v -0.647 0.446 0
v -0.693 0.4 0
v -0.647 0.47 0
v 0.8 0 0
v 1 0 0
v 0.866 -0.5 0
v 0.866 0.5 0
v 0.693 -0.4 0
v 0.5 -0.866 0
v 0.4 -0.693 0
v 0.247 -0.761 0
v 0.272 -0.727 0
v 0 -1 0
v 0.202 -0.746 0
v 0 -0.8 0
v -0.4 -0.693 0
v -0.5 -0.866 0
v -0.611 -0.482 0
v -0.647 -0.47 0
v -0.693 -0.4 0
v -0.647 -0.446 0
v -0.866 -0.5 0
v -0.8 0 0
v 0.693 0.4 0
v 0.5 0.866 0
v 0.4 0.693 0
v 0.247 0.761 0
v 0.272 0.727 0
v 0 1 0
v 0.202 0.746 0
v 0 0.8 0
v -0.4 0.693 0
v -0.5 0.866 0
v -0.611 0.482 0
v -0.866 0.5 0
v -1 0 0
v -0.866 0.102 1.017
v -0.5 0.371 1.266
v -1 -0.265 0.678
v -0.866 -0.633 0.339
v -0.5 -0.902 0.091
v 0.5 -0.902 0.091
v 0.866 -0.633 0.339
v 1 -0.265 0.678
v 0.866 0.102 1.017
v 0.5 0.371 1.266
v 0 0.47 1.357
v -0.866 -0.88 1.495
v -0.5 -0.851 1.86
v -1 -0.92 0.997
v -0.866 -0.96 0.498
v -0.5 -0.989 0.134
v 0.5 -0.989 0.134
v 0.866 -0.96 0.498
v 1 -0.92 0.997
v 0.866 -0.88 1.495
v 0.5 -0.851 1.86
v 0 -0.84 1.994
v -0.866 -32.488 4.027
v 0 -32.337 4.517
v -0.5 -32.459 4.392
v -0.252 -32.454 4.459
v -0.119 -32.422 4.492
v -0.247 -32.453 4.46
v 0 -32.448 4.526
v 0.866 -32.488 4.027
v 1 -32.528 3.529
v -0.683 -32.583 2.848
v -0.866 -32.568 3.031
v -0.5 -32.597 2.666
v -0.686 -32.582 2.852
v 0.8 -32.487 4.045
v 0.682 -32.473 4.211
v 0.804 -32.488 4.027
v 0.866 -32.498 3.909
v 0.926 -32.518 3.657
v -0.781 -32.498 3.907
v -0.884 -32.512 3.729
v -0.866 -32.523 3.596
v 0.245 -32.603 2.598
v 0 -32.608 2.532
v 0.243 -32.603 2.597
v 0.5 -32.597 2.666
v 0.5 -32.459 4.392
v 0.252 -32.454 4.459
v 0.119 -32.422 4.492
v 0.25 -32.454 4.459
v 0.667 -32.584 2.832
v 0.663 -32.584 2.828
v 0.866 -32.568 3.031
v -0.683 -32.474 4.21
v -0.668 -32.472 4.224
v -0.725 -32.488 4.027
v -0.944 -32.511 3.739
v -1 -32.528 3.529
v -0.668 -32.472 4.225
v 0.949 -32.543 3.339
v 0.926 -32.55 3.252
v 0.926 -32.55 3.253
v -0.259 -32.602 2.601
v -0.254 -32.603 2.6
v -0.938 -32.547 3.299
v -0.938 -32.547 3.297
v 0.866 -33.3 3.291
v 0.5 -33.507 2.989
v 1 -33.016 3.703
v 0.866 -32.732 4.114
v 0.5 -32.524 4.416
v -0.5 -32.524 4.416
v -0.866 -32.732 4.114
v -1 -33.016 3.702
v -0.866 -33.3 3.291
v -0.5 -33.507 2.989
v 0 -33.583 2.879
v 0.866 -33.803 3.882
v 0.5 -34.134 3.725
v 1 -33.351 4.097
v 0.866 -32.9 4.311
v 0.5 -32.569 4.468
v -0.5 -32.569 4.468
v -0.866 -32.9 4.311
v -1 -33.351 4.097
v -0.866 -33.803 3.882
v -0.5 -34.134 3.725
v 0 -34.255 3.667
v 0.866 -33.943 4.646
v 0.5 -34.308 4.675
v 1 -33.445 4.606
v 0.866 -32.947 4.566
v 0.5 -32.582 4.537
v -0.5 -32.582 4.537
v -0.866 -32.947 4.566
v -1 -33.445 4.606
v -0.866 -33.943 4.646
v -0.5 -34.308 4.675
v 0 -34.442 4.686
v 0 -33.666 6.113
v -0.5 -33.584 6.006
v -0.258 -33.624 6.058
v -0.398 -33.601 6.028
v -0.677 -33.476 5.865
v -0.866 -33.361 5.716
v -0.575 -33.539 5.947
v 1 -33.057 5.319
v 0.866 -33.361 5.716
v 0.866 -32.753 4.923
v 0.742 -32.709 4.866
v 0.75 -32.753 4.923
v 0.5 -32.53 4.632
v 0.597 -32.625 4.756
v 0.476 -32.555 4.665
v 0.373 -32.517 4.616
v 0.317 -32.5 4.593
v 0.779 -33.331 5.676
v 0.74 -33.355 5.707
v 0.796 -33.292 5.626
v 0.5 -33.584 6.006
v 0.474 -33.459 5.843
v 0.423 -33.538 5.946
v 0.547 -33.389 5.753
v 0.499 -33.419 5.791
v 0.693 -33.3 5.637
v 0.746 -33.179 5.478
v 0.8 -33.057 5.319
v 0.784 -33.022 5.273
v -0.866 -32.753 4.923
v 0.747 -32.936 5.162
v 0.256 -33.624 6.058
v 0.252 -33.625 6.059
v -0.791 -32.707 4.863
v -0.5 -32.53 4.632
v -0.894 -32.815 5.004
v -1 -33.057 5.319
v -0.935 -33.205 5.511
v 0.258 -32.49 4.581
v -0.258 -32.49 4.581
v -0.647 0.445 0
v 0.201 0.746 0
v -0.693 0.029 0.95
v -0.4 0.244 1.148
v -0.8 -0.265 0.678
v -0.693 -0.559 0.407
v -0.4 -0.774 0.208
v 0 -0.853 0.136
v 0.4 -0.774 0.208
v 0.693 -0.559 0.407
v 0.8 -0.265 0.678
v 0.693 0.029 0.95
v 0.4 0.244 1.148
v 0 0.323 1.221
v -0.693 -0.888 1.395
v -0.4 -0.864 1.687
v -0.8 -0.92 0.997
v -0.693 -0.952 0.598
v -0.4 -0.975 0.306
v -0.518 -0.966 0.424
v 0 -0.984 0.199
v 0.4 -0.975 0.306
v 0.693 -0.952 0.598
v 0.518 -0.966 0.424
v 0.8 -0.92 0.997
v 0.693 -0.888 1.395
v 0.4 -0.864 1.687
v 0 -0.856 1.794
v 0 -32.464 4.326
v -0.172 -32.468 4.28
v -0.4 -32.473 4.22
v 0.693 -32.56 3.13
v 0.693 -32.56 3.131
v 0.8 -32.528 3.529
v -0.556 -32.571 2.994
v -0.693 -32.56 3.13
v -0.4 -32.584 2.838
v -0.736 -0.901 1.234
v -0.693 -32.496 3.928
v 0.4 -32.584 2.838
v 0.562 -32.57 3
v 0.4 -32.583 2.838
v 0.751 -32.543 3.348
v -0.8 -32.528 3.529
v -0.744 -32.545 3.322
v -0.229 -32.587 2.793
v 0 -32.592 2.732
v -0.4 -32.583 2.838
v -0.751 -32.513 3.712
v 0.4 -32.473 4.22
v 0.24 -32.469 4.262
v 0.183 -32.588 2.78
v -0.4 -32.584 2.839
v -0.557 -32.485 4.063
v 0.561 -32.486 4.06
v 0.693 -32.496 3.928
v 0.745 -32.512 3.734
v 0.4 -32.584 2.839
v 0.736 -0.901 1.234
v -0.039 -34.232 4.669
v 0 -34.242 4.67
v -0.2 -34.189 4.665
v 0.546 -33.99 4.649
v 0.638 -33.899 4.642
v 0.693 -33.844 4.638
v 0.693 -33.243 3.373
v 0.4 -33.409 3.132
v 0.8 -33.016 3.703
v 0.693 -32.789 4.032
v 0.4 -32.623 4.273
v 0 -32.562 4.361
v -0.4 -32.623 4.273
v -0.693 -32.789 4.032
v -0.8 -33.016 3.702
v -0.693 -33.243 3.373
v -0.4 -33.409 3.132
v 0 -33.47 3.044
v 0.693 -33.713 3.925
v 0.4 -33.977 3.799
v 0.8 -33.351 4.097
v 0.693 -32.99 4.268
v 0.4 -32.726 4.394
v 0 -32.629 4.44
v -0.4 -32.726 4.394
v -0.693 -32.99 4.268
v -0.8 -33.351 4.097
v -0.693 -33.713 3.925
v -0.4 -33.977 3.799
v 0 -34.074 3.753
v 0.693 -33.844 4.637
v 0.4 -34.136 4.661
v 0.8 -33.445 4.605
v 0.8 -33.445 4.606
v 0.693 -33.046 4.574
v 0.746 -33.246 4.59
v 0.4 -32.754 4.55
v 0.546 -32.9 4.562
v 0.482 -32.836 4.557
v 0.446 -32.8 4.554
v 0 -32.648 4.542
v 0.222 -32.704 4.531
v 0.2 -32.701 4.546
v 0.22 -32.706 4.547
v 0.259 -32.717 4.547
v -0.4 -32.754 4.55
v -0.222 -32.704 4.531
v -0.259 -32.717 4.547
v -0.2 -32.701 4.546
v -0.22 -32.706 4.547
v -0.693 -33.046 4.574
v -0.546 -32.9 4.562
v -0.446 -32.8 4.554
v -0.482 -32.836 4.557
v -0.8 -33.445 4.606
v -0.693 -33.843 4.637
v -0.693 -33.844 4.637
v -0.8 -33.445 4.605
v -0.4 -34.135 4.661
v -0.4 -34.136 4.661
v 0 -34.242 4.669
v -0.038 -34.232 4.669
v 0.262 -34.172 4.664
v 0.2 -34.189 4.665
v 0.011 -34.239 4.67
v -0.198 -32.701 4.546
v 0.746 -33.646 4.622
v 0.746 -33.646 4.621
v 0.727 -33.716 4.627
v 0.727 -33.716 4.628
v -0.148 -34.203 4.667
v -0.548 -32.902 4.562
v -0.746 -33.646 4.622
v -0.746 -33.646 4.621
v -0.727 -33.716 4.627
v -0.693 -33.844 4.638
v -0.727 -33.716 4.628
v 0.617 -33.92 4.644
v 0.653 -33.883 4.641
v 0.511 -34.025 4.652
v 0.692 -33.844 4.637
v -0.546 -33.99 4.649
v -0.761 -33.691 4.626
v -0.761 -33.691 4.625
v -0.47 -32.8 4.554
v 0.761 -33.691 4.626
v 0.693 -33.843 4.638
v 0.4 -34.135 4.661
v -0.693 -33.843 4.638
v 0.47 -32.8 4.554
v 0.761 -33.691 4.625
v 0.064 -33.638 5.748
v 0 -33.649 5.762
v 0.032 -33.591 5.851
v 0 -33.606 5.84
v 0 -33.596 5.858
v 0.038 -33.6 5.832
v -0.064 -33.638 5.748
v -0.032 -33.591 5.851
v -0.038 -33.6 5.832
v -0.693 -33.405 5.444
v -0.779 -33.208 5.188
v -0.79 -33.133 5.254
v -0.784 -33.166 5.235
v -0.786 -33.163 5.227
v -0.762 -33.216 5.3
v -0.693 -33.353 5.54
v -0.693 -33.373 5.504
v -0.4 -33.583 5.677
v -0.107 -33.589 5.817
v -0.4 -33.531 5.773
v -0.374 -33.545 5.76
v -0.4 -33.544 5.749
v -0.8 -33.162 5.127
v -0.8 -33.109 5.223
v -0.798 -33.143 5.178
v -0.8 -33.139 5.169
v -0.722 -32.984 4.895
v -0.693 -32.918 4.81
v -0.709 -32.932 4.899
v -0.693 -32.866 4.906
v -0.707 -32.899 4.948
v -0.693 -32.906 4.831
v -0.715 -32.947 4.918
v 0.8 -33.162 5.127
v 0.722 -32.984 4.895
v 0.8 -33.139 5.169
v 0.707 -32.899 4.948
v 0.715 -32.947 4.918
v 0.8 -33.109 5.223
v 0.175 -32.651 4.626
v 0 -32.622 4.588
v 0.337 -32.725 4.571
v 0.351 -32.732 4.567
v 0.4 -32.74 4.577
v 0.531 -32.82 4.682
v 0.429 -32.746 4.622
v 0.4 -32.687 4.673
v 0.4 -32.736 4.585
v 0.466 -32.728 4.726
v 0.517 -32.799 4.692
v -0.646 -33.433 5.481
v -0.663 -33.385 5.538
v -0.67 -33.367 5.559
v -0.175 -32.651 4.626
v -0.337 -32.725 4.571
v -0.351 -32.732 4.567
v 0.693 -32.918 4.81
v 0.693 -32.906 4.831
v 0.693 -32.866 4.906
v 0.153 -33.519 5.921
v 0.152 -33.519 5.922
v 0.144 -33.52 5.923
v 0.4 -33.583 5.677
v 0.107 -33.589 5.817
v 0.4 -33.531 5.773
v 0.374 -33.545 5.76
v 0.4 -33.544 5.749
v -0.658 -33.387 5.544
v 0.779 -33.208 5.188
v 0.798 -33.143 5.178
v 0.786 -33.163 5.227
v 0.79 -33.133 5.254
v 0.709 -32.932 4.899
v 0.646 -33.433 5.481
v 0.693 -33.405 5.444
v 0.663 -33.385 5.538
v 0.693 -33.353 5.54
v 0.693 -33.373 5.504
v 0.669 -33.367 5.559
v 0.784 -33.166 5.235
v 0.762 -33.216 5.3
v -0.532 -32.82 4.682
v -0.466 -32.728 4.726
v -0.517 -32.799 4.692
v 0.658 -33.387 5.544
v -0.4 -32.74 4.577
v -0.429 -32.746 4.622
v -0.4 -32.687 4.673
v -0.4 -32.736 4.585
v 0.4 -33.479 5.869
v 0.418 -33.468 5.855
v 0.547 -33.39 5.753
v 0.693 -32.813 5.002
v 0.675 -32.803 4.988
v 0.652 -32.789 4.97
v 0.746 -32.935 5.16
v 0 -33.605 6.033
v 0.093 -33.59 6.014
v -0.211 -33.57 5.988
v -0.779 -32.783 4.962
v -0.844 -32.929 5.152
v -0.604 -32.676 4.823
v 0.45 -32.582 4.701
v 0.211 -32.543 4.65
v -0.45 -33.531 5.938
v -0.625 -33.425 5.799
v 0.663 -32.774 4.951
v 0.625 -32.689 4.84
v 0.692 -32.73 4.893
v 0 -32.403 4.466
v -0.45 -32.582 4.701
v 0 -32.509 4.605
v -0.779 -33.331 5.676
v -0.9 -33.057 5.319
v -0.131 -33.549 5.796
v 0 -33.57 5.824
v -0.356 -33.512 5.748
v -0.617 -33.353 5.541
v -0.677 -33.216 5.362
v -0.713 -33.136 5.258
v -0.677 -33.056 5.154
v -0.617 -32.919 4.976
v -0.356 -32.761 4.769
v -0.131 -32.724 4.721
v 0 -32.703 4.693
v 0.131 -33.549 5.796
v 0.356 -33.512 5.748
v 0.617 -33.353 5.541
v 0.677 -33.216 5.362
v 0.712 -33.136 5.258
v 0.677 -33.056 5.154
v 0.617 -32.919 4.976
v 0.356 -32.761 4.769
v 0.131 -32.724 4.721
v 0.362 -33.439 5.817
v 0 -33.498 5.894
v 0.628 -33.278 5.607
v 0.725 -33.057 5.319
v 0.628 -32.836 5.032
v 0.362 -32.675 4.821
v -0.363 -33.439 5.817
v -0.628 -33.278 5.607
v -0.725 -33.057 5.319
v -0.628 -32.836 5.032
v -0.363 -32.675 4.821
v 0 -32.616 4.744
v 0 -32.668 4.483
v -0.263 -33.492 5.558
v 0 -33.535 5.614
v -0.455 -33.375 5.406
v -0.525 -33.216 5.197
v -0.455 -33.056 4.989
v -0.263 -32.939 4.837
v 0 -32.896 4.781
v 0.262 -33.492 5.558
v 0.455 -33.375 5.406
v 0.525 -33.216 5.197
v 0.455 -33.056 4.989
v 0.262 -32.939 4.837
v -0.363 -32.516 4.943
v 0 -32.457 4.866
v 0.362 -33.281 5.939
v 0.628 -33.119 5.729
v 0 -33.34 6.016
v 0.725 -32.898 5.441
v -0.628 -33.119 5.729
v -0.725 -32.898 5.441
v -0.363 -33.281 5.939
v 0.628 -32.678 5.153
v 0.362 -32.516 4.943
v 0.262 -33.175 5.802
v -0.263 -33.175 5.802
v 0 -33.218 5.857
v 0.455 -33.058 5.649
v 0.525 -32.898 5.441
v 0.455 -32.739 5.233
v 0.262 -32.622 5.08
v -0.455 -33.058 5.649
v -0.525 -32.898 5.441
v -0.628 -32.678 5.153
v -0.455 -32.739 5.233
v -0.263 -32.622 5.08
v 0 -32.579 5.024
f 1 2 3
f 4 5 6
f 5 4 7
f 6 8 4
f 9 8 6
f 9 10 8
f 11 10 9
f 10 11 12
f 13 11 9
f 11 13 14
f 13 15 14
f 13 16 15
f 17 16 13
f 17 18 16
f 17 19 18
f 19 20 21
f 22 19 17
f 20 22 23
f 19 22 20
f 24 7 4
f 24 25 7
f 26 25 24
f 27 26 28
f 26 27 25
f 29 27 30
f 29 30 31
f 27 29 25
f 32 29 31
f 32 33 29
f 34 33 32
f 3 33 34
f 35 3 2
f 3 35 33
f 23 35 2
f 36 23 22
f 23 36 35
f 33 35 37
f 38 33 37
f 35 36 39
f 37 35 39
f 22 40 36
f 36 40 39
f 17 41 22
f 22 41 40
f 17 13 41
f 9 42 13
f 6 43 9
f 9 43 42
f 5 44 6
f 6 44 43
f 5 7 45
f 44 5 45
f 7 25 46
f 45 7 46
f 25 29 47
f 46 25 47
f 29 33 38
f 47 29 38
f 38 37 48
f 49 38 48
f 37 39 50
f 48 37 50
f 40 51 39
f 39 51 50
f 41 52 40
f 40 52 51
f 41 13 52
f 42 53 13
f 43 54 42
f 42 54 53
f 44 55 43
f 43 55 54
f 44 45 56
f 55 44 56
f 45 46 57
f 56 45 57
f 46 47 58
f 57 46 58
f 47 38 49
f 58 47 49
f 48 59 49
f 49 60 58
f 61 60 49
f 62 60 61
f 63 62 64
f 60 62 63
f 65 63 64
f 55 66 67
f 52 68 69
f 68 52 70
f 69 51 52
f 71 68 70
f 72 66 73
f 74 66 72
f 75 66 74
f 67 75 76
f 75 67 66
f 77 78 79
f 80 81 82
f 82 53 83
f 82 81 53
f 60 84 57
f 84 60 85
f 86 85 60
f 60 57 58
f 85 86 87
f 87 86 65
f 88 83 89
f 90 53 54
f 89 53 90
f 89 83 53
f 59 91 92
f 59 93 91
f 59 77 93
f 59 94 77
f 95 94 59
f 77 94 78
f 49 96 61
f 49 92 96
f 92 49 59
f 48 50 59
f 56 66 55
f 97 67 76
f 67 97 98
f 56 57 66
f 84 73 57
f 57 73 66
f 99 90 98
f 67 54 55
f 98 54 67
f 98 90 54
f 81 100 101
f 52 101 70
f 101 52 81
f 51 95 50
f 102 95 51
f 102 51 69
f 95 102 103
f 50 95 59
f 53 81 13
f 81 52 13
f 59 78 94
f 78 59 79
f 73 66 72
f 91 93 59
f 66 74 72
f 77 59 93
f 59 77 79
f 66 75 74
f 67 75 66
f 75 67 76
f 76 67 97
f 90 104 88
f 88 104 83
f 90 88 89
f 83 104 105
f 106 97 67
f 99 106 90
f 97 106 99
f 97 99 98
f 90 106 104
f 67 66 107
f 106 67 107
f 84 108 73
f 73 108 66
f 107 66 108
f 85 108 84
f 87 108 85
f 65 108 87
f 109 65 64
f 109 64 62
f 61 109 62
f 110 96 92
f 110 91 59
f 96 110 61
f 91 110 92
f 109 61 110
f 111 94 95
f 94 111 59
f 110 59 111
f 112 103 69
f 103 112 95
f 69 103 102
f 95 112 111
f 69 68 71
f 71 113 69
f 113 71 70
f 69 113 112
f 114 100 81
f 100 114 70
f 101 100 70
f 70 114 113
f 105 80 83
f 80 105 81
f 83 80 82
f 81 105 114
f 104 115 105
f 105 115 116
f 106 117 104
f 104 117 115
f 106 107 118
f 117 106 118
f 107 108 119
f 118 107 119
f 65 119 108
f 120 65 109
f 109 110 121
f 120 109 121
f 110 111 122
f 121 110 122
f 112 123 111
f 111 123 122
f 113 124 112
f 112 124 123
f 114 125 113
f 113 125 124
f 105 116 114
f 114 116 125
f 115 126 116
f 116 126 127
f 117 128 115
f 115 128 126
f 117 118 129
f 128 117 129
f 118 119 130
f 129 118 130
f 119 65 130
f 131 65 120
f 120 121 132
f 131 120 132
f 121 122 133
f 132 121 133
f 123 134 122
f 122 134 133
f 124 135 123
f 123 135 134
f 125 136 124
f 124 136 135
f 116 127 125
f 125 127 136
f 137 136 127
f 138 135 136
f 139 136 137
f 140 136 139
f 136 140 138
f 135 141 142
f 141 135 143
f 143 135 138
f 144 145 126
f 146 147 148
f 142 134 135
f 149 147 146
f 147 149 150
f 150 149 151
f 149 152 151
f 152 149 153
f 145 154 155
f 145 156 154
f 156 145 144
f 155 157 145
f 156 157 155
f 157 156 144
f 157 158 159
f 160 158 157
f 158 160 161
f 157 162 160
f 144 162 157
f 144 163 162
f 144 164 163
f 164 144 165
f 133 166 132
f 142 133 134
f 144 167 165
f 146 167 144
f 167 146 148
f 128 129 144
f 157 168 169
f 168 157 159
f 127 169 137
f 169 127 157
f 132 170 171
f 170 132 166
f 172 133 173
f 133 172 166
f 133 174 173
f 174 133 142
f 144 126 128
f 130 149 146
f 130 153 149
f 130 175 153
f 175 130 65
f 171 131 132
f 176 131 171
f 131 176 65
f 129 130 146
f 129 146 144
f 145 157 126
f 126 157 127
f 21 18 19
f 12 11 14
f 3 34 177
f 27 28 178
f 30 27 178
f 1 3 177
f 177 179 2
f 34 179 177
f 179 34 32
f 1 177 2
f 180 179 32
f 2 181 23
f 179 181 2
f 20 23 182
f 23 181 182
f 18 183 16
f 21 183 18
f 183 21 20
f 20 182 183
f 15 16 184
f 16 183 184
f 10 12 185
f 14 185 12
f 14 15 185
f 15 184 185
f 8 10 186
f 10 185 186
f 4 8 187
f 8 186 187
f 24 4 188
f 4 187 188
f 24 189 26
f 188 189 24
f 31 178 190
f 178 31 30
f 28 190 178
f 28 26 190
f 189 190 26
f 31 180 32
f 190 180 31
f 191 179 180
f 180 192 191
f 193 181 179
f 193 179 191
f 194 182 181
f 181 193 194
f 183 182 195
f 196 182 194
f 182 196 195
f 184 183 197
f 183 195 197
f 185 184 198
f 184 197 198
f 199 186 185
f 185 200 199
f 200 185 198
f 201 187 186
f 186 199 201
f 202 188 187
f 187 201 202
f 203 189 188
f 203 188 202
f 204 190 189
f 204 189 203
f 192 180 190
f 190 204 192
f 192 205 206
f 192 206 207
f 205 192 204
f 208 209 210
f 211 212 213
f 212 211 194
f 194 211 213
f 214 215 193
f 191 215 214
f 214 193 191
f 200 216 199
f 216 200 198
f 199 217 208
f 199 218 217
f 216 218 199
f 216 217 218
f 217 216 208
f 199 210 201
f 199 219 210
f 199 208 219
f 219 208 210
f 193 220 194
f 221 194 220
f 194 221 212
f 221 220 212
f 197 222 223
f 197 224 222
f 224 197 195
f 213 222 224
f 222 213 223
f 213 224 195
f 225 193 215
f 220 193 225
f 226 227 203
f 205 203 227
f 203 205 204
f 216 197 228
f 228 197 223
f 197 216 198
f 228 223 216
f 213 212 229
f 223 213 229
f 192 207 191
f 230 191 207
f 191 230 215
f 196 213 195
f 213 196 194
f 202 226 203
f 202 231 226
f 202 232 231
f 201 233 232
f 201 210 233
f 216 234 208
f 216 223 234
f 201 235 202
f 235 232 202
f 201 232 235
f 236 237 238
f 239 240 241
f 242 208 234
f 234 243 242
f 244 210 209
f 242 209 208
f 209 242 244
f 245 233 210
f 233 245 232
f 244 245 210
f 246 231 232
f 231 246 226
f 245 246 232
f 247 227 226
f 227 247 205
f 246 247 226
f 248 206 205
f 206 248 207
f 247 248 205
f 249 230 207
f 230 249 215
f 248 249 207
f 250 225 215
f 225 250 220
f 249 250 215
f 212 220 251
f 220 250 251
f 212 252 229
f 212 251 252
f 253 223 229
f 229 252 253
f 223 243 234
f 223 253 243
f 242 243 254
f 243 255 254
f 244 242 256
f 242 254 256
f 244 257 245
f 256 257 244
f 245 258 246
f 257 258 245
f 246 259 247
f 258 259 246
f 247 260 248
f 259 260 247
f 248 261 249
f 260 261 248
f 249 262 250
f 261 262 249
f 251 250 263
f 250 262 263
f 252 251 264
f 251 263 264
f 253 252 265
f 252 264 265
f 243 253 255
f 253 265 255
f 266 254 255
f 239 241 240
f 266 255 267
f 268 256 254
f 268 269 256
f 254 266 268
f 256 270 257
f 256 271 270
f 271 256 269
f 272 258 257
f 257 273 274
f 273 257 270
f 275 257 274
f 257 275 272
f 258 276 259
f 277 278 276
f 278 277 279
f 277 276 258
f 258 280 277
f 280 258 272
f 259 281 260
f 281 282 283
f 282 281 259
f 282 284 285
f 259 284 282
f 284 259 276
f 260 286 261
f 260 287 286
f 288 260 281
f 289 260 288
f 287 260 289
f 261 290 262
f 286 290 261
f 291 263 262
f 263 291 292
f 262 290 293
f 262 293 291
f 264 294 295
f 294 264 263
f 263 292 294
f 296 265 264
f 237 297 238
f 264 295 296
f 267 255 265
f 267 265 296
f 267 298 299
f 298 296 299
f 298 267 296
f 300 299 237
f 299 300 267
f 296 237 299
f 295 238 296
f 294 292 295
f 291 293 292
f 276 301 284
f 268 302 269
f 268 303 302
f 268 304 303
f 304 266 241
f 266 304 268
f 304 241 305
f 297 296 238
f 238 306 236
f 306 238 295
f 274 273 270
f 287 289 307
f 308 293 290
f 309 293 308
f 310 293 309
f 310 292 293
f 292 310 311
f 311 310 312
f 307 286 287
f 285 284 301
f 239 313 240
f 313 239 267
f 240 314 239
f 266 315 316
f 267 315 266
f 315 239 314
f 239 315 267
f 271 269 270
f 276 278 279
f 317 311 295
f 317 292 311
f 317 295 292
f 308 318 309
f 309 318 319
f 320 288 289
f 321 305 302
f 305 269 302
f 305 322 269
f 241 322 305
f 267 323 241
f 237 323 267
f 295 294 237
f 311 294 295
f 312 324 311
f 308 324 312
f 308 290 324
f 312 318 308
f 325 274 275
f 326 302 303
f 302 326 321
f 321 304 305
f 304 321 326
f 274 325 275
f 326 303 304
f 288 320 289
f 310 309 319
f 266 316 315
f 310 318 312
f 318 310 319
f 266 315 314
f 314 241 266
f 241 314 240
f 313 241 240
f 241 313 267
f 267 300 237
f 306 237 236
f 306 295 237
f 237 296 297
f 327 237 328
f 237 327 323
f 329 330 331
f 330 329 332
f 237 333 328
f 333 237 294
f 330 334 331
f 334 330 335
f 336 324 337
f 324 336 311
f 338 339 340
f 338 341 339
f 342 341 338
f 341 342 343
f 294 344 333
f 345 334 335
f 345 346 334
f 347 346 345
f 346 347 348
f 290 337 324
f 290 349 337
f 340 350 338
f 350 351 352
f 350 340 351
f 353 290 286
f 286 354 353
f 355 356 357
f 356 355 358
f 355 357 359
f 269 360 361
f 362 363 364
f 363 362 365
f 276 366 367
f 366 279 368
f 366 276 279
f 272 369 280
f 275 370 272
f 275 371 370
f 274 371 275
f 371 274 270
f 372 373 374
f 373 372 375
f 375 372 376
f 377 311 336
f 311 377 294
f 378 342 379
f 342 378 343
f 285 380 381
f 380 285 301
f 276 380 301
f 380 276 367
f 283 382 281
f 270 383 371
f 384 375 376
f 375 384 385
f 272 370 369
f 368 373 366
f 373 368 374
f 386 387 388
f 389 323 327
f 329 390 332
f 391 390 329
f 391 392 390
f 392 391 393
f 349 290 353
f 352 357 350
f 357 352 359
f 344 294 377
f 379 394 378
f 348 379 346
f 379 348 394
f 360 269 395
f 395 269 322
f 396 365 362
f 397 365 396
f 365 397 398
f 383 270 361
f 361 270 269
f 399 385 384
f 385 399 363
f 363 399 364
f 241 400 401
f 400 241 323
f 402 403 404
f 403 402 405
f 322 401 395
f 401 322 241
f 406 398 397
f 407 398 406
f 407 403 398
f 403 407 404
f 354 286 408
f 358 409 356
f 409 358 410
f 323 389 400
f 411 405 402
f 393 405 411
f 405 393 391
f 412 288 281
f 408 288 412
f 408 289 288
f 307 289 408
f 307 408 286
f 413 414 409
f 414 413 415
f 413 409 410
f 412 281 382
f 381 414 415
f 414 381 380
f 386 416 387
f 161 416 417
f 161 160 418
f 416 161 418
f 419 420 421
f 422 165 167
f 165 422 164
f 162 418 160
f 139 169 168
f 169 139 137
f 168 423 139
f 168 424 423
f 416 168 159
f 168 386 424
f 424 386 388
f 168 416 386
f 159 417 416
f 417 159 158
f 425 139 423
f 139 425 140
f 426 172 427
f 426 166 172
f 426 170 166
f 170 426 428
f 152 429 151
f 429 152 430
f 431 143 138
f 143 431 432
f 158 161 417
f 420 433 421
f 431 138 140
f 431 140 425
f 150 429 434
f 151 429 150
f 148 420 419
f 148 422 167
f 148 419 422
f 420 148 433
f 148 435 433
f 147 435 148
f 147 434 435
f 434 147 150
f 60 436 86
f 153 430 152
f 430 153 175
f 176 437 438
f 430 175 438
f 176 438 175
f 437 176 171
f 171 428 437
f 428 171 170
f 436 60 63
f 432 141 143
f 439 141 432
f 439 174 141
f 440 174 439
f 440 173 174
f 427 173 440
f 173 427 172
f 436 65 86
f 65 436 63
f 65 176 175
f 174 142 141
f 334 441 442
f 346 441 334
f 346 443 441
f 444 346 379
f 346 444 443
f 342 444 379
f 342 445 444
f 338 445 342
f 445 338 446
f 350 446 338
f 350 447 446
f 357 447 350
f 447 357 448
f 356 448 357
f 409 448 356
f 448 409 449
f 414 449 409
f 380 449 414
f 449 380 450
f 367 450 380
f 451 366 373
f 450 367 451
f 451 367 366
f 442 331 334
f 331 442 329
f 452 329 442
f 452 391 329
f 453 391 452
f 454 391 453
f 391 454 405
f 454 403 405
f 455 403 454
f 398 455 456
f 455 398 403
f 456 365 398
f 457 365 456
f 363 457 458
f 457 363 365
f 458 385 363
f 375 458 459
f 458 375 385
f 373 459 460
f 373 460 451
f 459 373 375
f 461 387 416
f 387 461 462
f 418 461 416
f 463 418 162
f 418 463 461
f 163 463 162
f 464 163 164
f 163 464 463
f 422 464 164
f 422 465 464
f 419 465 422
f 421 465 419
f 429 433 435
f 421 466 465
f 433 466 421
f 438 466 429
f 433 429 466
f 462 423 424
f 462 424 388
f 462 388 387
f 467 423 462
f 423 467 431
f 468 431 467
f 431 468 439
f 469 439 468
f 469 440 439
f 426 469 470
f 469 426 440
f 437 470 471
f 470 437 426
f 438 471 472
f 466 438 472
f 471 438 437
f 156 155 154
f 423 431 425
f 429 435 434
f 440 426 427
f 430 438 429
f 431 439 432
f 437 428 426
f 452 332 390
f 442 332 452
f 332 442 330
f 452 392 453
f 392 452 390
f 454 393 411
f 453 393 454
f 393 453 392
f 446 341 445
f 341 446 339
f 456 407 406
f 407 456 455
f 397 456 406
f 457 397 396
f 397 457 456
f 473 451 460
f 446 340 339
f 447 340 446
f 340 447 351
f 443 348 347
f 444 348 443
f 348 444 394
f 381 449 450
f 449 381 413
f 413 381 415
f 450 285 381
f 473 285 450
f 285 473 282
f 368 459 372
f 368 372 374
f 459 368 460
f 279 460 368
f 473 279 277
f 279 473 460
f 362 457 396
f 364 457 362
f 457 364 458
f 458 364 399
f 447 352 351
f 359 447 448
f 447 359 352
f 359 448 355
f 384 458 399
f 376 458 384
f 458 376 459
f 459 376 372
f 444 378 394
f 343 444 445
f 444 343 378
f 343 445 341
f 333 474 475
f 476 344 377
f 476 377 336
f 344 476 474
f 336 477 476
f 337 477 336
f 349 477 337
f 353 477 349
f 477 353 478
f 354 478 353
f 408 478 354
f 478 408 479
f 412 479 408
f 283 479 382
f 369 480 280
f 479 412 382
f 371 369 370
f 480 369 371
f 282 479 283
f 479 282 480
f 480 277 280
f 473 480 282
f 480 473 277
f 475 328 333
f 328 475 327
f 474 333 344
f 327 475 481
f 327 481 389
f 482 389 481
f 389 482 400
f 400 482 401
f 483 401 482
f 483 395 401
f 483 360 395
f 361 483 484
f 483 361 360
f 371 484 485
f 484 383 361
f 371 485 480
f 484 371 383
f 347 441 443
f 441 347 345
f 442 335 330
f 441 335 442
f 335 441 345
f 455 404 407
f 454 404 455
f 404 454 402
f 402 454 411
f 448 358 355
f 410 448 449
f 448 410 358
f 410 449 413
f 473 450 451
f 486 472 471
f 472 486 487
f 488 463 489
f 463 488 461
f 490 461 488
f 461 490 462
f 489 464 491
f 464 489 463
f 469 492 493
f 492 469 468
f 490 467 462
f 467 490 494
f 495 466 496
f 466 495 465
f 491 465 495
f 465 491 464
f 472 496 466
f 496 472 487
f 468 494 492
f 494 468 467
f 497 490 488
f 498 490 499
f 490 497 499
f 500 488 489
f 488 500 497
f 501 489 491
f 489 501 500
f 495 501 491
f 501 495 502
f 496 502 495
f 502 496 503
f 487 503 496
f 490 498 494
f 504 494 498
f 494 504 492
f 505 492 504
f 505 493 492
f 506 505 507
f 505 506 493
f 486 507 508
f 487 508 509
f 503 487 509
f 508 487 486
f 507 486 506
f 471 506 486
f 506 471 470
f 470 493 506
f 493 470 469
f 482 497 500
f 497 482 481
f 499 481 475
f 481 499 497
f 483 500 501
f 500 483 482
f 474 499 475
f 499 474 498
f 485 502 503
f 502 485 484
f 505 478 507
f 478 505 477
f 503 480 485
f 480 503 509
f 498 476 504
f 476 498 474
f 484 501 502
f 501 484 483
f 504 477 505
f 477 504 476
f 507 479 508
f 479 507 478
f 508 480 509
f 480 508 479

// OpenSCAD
tolerance=0.075;
hole_radius=0.05;
grid_hole_radius=0.05;
outer_radius=1;
thickness=0.2;
hole_attach_height=0.05;
attach_thickness=0.1;

//parameters that don't have to be defined explicitly
eps = tolerance/100;
inner_radius = outer_radius - thickness;
fn = 12;
fnh = 6;

module angled_cylinder(angle_deg_y, _h, _r, angle_deg_x = 0) {
    rotate([angle_deg_x, angle_deg_y, 0]) { // Rotate the cylinder 
            cylinder(h = _h, r = _r, center = true, $fn = fnh);
        }
}

module hole(_h) {
    cylinder(h = _h, r = grid_hole_radius, $fn = fnh);
}

//makes circle of holes
module circular_grid(_h, _r, _n) {
    for (i = [0:_n-1]) {
        angle = i * 360 / _n;
        x_pos = _r * cos(angle);
        y_pos = _r * sin(angle);
        translate([x_pos, y_pos, -eps]) {
            hole(_h);
        }
    }
}

//makes grid of holes
module hole_grid(hole_height, grid_h) {
    translate([0,0,hole_height]) {
        difference() {
            //cylinder
            cylinder(h = grid_h, r = (inner_radius + outer_radius)/2, 
                center=false, $fn = fn);
            //holes
            for (i = [0 : grid_hole_radius * 2 + hole_attach_height : inner_radius - grid_hole_radius * 2]) {
                circular_grid(grid_h + eps*2, i, ceil(6.28*i/(grid_hole_radius*4)));
            }
            
        } 
    }
}

//makes curve of CSC
module curve(_radius, _twist, _turning_angle, _turning_radius) {
    rotate([90,0,_twist])
    translate([-_turning_radius, 0, 0])
    rotate_extrude(angle=_turning_angle, convexity=100, $fn = fn)
    translate([_turning_radius, 0]) circle(_radius);
}

module CSC(_r, _t1, _ta1, _tr1, _h, _t2, _ta2, _tr2, is_inner) {
    
    if (_ta1 > 90) {
        CSC(_r, _t1, 90, _tr1, 0, 0, 0, 0, is_inner);
        
        pos1 = (-_tr1 + sqrt(_tr1*_tr1 - pow(_tr1,2)));
        translate([pos1*cos(_t1),pos1*sin(_t1),_tr1])
        rotate([0,-90,_t1])
        CSC(_r, 0, _ta1 - 90, _tr1, _h, _t2, _ta2, _tr2, is_inner);
    } else if (_ta2 > 90) {
        CSC(_r, _t1, _ta1, _tr1, _h, _t2, 90, _tr2, is_inner);
        
        pos1 = (-_tr1 + sqrt(_tr1*_tr1 - pow(_tr1*sin(_ta1),2)));
        pos2 = (-_tr2 + sqrt(_tr2*_tr2 - pow(_tr2,2)));
        translate([pos1*cos(_t1),pos1*sin(_t1),_tr1*sin(_ta1)])
        rotate([0,-_ta1,_t1])
        translate([0, 0, _h])
        translate([pos2*cos(_t2),pos2*sin(_t2),_tr2])
        rotate([0,-90,_t2])
        CSC(_r, 0, 0, 0, 0, 0, _ta2 - 90, _tr2, is_inner);
    } else {
        //intermediate positions
        pos1 = (-_tr1 + sqrt(_tr1*_tr1 - pow(_tr1*sin(_ta1),2)));
        pos2 = (-_tr2 + sqrt(_tr2*_tr2 - pow(_tr2*sin(_ta2),2)));
        
        union() {
            //bottom shell threshold
            if (is_inner) {
                cylinder(h=eps, r=_r, center=true);
            }
            
            //first curve of CSC
            curve(_r, _t1, _ta1, _tr1);
            
            //straight link of CSC
            translate([pos1*cos(_t1),pos1*sin(_t1),_tr1*sin(_ta1)])
            rotate([0,-_ta1,_t1])
            if (is_inner) {
                //add threshold for shelling
                translate([0,0,-eps /2])
                cylinder(h=_h + eps,r=_r, center = false, $fn= fn);
            } else {
                cylinder(h=_h,r=_r, center = false, $fn= fn);
            }
            
            //second curve of CSC
            translate([pos1*cos(_t1),pos1*sin(_t1),_tr1*sin(_ta1)])
            rotate([0,-_ta1,_t1])
            translate([0, 0, _h])
            curve(_r, _t2, _ta2, _tr2);
            
            //shelling thresholds
            if (is_inner) {
                translate([pos1*cos(_t1),pos1*sin(_t1),_tr1*sin(_ta1)])
                rotate([0,-_ta1,_t1])
                translate([0, 0, _h])
                translate([pos2*cos(_t2),pos2*sin(_t2),_tr2*sin(_ta2)])
                rotate([0,-_ta2,_t2]) {
                    cylinder(h=eps, r=_r, center=true,$fn=fn);
                }
            
            }
        }
    }
    
}

//allow modules to attach
module CSC_ATTACH(_r, _t1, _ta1, _tr1, _h, _t2, _ta2, _tr2, next_hole_radius, next_hole_attach_height, next_inner) {
    
    if (_ta1 > 90) {        
        pos1 = (-_tr1 + sqrt(_tr1*_tr1 - pow(_tr1,2)));
        translate([pos1*cos(_t1),pos1*sin(_t1),_tr1])
        rotate([0,-90,_t1])
        CSC_ATTACH(_r, 0, _ta1 - 90, _tr1, _h, _t2, _ta2, _tr2, next_hole_radius, next_hole_attach_height, next_inner);
    } else if (_ta2 > 90) {        
        pos1 = (-_tr1 + sqrt(_tr1*_tr1 - pow(_tr1*sin(_ta1),2)));
        pos2 = (-_tr2 + sqrt(_tr2*_tr2 - pow(_tr2,2)));
        translate([pos1*cos(_t1),pos1*sin(_t1),_tr1*sin(_ta1)])
        rotate([0,-_ta1,_t1])
        translate([0, 0, _h])
        translate([pos2*cos(_t2),pos2*sin(_t2),_tr2])
        rotate([0,-90,_t2])
        CSC_ATTACH(_r, 0, 0, 0, 0, 0, _ta2 - 90, _tr2, next_hole_radius, next_hole_attach_height, next_inner);
    } else {
        //intermediate positions
        pos1 = (-_tr1 + sqrt(_tr1*_tr1 - pow(_tr1*sin(_ta1),2)));
        pos2 = (-_tr2 + sqrt(_tr2*_tr2 - pow(_tr2*sin(_ta2),2)));
        
        translate([pos1*cos(_t1),pos1*sin(_t1),_tr1*sin(_ta1)])
        rotate([0,-_ta1,_t1])
        translate([0, 0, _h])
        translate([pos2*cos(_t2),pos2*sin(_t2),_tr2*sin(_ta2)])
        rotate([0,-_ta2,_t2]) {
            difference() {
                union() {
                    //attachment for smaller cylinder
                    translate([0,0,-attach_thickness])
                    cylinder(h=attach_thickness, r=_r - thickness/2, $fn=fn);
                    translate([0,0,-attach_thickness*2])
                    cylinder(h=attach_thickness*2, r1=_r - thickness/2, r2=next_inner - tolerance - thickness, $fn=fn);
                    
                    //small cylinder
                    cylinder(h=next_hole_radius*2 + next_hole_attach_height * 2, r = next_inner - tolerance, $fn=fn);
                }
                
                //shelling
                translate([0,0, -attach_thickness*2 - eps/2])
                cylinder(h=next_hole_radius*2 + next_hole_attach_height * 2 + attach_thickness*2 + eps, r = min(inner_radius, next_inner - tolerance - thickness), $fn=fn);
                
                //holes for screws
    //            translate([0,0,next_hole_attach_height + next_hole_radius]) {
    //                angled_cylinder(0, (next_inner + thickness + eps) * 2,  hole_radius, 90);
    //                angled_cylinder(90, (next_inner + thickness + eps) * 2, hole_radius, 0);
    //            }
            }
        }
    }
}

//remove overlap to allow all branches to attach to each other
module CSC_REMOVE_OVERLAP(_r, _t1, _ta1, _tr1, _h, _t2, _ta2, _tr2, next_hole_radius, next_hole_attach_height, next_inner) {
    if (_ta1 > 90) {        
        pos1 = (-_tr1 + sqrt(_tr1*_tr1 - pow(_tr1,2)));
        translate([pos1*cos(_t1),pos1*sin(_t1),_tr1])
        rotate([0,-90,_t1])
        CSC_REMOVE_OVERLAP(_r, 0, _ta1 - 90, _tr1, _h, _t2, _ta2, _tr2, next_hole_radius, next_hole_attach_height, next_inner);
    } else if (_ta2 > 90) {        
        pos1 = (-_tr1 + sqrt(_tr1*_tr1 - pow(_tr1*sin(_ta1),2)));
        pos2 = (-_tr2 + sqrt(_tr2*_tr2 - pow(_tr2,2)));
        translate([pos1*cos(_t1),pos1*sin(_t1),_tr1*sin(_ta1)])
        rotate([0,-_ta1,_t1])
        translate([0, 0, _h])
        translate([pos2*cos(_t2),pos2*sin(_t2),_tr2])
        rotate([0,-90,_t2])
        CSC_REMOVE_OVERLAP(_r, 0, 0, 0, 0, 0, _ta2 - 90, _tr2, next_hole_radius, next_hole_attach_height, next_inner);
    } else {
        pos1 = (-_tr1 + sqrt(_tr1*_tr1 - pow(_tr1*sin(_ta1),2)));
        pos2 = (-_tr2 + sqrt(_tr2*_tr2 - pow(_tr2*sin(_ta2),2)));
        
        translate([pos1*cos(_t1),pos1*sin(_t1),_tr1*sin(_ta1)])
        rotate([0,-_ta1,_t1])
        translate([0, 0, _h])
        translate([pos2*cos(_t2),pos2*sin(_t2),_tr2*sin(_ta2)])
        rotate([0,-_ta2,_t2]) {
            cylinder(h=999999, r=_r + tolerance, $fn=fn);
        }
    }
}

//c is _t1, _ta1, _tr1, _h, _t2, _ta2, _tr2, next hole radius, next hole height, next inner radius
module branch(branch_list, _outer, _inner) {
    union() {
        //make grid of holes
        //hole_grid(hole_radius*2 + hole_attach_height * 2, grid_hole_radius);
        
        //make CSC shells for each CSC in branch_list
        difference() {
            for (c = branch_list) {
                CSC(_outer,c[0],c[1],c[2],c[3],c[4],c[5],c[6], false);
            }
            
            for (c = branch_list) {
                CSC(_inner,c[0],c[1],c[2],c[3],c[4],c[5],c[6], true);
                CSC_REMOVE_OVERLAP(_outer,c[0],c[1],c[2],c[3],c[4],c[5],c[6],c[7], c[8], c[9]);
            }
            
            //make screw holes at the bottom
//            translate([0,0,hole_radius + hole_attach_height]) {
//                angled_cylinder(0, (outer_radius*1.5 + eps) * 2,  hole_radius, 90);
//                angled_cylinder(90, (outer_radius*1.5 + eps) * 2, hole_radius, 0);
//            }    
        }
        for (c=branch_list) {     
            CSC_ATTACH(_outer,c[0],c[1],c[2],c[3],c[4],c[5],c[6], c[7], c[8], c[9]);
        }
    }
}

branch([
[ 90.0, 85.4196, 1.0*outer_radius, 31.7092*outer_radius, -179.999, 137.9196, 1.0*outer_radius, 0.05, 0.05, 0.8],
],outer_radius,inner_radius);
